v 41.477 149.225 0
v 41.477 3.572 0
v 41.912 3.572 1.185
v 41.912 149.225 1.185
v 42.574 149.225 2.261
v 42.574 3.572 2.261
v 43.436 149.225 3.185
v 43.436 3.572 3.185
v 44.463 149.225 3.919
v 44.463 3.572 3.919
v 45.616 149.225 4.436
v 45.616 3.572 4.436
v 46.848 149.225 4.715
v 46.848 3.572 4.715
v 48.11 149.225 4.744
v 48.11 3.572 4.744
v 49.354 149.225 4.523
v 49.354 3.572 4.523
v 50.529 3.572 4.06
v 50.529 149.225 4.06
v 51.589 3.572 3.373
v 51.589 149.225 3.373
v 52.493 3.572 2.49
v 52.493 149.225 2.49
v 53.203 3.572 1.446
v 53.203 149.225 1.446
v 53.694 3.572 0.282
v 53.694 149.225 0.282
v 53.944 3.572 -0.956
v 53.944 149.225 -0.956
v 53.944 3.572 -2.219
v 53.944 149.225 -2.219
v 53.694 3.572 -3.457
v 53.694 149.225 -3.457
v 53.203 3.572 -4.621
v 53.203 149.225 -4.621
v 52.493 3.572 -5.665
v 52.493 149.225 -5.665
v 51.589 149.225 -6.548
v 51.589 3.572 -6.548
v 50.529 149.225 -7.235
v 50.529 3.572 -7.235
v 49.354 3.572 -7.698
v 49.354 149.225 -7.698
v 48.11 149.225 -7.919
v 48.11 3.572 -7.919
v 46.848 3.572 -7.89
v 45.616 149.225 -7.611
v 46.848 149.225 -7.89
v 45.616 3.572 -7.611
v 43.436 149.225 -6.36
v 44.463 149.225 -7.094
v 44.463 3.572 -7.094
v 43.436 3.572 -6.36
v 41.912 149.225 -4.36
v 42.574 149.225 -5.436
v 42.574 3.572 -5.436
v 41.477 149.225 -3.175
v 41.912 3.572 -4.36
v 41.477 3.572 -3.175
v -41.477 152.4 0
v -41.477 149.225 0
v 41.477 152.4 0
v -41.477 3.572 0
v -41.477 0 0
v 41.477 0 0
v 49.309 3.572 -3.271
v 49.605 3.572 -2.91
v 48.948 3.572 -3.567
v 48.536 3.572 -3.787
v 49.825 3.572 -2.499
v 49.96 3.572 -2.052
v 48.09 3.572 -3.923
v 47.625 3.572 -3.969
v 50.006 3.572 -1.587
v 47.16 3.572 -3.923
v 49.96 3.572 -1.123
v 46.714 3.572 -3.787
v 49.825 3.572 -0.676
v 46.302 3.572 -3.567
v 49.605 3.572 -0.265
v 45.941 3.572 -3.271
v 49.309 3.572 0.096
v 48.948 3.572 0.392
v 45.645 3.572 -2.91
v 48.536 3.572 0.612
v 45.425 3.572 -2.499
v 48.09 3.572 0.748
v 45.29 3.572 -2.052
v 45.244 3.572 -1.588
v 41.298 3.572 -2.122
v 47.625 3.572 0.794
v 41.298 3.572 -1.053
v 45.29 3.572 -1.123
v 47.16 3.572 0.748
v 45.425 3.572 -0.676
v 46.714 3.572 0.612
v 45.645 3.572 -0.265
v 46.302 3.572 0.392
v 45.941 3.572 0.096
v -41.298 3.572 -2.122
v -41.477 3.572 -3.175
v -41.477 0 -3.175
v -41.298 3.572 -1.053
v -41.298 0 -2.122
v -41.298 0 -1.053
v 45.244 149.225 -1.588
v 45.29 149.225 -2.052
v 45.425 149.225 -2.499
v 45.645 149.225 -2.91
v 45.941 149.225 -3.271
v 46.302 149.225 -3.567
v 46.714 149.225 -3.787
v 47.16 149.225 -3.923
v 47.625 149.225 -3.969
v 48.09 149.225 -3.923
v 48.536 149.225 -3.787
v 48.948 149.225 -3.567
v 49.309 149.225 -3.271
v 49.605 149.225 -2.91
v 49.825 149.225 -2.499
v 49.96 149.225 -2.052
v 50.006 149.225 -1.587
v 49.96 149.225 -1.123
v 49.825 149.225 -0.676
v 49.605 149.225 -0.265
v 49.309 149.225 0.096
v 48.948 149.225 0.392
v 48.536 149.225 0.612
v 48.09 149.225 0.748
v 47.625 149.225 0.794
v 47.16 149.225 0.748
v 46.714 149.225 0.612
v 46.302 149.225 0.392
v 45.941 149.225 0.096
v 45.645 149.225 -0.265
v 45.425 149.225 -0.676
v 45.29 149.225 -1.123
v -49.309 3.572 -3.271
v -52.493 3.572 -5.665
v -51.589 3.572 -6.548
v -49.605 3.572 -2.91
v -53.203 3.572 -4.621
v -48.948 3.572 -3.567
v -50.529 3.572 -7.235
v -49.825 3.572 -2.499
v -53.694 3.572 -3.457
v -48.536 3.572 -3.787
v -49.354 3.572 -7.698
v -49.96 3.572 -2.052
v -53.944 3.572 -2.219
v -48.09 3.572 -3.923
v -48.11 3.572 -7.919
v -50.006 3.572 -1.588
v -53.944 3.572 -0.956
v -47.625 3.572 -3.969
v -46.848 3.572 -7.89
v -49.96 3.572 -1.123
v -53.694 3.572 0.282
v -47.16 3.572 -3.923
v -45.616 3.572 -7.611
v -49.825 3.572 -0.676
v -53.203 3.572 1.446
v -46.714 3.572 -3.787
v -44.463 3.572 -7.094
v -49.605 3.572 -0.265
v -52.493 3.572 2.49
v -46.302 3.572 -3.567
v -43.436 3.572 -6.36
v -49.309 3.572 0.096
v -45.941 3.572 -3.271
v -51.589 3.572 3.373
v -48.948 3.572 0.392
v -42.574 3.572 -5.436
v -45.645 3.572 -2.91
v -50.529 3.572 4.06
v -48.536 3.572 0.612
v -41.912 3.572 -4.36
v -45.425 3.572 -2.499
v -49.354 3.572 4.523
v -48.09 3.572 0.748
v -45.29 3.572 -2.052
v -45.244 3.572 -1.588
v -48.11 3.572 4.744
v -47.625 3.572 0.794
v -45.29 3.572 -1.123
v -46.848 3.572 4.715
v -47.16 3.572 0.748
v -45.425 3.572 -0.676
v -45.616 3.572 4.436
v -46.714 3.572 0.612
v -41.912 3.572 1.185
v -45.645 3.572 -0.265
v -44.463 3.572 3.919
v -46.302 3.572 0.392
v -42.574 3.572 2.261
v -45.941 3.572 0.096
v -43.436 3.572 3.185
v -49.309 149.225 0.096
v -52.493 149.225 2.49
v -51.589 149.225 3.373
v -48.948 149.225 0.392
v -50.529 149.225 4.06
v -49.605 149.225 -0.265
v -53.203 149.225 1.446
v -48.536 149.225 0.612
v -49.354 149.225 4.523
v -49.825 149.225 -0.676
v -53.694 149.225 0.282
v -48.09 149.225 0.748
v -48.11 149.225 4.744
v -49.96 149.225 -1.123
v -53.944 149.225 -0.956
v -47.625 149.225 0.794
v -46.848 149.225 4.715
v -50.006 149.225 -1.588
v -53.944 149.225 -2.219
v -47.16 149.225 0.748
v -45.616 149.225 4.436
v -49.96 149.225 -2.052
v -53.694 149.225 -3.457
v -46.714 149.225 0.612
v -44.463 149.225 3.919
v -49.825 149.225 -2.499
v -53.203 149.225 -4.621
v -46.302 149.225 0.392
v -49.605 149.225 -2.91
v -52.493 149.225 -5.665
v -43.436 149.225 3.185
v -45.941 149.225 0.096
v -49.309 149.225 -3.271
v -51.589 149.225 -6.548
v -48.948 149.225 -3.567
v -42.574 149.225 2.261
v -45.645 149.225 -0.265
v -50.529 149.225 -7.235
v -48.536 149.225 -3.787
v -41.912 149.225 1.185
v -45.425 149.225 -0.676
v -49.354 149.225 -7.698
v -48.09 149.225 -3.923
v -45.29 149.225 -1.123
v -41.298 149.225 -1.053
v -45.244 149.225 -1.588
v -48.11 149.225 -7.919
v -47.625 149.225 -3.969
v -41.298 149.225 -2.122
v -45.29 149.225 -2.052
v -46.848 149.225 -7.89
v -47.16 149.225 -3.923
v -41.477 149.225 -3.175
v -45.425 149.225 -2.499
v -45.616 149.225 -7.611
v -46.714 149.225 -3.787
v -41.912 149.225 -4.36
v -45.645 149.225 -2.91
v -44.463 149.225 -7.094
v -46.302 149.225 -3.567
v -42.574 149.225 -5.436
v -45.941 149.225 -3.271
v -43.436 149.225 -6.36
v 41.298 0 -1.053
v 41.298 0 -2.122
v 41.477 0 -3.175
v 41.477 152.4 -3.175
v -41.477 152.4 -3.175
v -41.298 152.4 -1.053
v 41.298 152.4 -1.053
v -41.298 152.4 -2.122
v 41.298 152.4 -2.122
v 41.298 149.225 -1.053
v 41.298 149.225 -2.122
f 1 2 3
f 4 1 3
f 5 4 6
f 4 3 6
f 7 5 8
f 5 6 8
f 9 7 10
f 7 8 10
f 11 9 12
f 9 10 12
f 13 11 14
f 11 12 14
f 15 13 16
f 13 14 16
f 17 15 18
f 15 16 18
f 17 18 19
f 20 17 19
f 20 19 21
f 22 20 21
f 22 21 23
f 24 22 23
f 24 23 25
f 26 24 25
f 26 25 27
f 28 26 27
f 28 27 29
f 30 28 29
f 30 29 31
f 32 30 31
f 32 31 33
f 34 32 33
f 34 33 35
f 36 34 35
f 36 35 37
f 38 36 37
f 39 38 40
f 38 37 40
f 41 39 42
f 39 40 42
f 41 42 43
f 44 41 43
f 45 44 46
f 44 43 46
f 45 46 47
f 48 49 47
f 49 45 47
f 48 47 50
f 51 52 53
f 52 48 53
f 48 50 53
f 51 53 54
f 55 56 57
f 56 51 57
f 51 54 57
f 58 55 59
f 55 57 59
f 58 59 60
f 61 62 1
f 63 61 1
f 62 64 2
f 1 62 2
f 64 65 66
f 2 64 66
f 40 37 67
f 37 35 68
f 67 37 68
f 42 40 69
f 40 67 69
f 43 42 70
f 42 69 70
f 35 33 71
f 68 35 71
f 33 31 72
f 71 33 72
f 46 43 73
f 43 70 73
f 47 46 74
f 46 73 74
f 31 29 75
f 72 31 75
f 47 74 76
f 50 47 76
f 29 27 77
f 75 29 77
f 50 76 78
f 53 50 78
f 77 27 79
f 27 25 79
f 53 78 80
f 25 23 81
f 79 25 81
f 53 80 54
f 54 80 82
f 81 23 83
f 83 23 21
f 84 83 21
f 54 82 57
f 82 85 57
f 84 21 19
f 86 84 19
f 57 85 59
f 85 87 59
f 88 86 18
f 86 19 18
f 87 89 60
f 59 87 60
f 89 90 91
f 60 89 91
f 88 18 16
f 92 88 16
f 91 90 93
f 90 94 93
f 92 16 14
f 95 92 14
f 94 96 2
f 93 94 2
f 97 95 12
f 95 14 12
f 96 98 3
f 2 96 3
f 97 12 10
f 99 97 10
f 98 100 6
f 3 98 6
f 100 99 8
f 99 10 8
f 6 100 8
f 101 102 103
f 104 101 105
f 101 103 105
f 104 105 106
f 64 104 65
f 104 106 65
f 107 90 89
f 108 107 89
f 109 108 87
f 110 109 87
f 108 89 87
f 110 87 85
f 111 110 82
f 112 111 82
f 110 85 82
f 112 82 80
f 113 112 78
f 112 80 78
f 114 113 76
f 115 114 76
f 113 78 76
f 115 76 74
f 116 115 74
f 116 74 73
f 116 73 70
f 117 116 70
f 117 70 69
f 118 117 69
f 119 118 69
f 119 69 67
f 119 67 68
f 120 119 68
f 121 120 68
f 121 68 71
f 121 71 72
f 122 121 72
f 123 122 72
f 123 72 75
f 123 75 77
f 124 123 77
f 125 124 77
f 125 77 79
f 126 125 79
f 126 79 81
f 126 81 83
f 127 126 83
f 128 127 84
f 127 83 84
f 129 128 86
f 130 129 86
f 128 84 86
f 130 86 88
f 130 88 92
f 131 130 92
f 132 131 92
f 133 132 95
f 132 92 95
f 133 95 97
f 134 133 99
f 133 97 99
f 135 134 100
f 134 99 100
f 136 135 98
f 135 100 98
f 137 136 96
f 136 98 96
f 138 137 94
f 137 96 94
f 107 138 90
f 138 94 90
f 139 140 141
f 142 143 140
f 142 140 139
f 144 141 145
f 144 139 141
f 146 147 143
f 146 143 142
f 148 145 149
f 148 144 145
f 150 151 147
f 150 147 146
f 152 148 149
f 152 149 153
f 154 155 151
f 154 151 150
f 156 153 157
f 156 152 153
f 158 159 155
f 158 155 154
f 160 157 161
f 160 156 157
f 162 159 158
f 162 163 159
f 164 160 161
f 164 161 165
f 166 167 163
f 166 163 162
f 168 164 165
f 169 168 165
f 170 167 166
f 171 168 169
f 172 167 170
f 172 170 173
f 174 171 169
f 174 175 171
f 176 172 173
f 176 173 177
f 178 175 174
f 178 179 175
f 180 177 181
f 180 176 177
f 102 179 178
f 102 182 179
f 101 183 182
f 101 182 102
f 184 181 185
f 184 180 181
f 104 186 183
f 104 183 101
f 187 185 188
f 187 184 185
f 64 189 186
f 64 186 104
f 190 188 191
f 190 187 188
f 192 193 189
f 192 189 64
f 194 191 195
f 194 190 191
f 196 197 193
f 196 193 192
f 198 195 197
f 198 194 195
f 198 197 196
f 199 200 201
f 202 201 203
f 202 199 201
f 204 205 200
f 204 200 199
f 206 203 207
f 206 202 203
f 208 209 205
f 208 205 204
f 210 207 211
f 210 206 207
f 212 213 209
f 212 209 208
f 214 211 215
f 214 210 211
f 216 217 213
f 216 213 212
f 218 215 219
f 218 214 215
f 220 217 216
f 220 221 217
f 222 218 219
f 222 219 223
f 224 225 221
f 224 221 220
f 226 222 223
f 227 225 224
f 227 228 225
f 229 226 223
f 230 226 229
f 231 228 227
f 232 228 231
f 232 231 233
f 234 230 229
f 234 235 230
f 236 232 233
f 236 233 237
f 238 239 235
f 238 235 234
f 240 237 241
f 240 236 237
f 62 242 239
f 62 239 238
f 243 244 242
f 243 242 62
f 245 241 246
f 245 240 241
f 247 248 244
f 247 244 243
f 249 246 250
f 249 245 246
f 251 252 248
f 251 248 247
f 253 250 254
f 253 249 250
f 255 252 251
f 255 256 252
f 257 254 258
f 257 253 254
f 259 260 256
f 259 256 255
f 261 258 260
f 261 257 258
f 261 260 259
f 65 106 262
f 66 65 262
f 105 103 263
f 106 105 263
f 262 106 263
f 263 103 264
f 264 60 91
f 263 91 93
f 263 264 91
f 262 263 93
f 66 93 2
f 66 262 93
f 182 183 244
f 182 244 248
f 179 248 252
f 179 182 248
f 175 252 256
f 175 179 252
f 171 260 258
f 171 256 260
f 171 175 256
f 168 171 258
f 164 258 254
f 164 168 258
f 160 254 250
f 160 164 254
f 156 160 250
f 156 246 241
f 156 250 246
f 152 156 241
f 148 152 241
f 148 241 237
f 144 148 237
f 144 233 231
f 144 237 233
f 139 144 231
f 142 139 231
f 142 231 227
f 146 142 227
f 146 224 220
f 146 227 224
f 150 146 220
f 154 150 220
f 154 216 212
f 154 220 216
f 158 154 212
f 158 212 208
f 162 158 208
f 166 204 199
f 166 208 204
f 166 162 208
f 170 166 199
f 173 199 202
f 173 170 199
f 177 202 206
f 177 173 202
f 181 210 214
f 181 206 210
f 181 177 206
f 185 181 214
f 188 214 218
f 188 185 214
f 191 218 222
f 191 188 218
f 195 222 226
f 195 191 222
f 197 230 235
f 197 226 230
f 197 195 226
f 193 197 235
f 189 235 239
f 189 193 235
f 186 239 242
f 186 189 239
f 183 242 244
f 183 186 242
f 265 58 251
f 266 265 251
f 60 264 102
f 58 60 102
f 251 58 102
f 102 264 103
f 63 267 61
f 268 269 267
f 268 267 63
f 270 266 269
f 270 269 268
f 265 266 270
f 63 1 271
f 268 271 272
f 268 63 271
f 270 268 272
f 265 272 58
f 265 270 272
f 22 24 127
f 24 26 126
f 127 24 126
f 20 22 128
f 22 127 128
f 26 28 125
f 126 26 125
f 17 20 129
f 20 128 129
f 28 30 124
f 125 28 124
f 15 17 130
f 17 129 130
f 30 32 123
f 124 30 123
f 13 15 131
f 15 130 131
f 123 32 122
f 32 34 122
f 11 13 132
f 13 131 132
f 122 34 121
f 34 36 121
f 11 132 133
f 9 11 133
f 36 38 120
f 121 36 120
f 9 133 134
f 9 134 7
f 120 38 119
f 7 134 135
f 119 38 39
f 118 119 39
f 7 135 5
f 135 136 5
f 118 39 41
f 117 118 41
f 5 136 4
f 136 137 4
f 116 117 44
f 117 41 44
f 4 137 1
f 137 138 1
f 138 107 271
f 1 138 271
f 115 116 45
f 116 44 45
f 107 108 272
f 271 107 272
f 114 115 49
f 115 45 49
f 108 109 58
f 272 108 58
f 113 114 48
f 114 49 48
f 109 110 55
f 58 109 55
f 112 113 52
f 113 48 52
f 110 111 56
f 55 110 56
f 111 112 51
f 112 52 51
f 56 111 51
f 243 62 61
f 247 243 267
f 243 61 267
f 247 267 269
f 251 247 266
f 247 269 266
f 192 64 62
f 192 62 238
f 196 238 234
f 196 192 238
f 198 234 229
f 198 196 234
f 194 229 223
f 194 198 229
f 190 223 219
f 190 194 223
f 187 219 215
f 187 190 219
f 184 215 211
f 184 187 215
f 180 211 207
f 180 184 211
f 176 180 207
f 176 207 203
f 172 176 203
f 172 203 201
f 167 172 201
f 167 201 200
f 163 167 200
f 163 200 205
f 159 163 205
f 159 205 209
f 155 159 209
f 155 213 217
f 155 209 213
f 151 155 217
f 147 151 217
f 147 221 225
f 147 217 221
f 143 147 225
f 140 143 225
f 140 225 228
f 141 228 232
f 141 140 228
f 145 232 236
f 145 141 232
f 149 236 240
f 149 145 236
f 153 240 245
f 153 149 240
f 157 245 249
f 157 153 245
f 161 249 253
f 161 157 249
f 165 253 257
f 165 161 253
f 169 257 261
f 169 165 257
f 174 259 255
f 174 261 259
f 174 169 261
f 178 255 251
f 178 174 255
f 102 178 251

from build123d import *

# Parameters (mm, degrees)
SKETCH1_R           = 2.38125
BOSS_EXTRUDE1_DEPTH = 152.4
SKETCH2_R           = 6.35
CUT_EXTRUDE1_DEPTH  = 3.571875
SKETCH3_R           = 6.35
CUT_EXTRUDE3_DEPTH  = 3.175


with BuildPart() as part:
    # Sketch1 → Boss-Extrude1 (new body)
    with BuildSketch(Plane(origin=(0, 0, 0), x_dir=(1, 0, 0), z_dir=(0, 1, 0))):
        with BuildLine():
            Line((-41.476638938, 3.175), (0, 3.175))
            Line((0, 3.175), (0, 0))
            Line((0, 0), (-41.476638938, 0))
            ThreePointArc((-41.476638938, 0), (-53.975, 1.5875), (-41.476638938, 3.175))
        make_face()
        with Locations((-47.625, 1.5875)):
            Circle(SKETCH1_R, mode=Mode.SUBTRACT)
    boss_extrude1 = extrude(amount=BOSS_EXTRUDE1_DEPTH)

    # Sketch2 → Cut-Extrude1 (cut)
    with BuildSketch(Plane.XZ):
        with Locations((-47.625, -1.5875)):
            Circle(SKETCH2_R)
    cut_extrude1 = extrude(amount=-CUT_EXTRUDE1_DEPTH, mode=Mode.SUBTRACT)

    # Sketch3 → Cut-Extrude3 (cut)
    with BuildSketch(Plane(origin=(0, 152.4, 0), x_dir=(1, 0, 0), z_dir=(0, 1, 0))):
        with Locations((-47.625, 1.5875)):
            Circle(SKETCH3_R)
    cut_extrude3 = extrude(amount=-CUT_EXTRUDE3_DEPTH, mode=Mode.SUBTRACT)

    # Mirror2: Boss-Extrude1, Cut-Extrude1, Cut-Extrude3 across plane
    add(boss_extrude1.mirror(Plane(origin=(0, 152.4, -3.175), x_dir=(0, 0, 1), z_dir=(1, 0, 0))))
    add(cut_extrude1.mirror(Plane(origin=(0, 152.4, -3.175), x_dir=(0, 0, 1), z_dir=(1, 0, 0))), mode=Mode.SUBTRACT)
    add(cut_extrude3.mirror(Plane(origin=(0, 152.4, -3.175), x_dir=(0, 0, 1), z_dir=(1, 0, 0))), mode=Mode.SUBTRACT)


solid = part.part
